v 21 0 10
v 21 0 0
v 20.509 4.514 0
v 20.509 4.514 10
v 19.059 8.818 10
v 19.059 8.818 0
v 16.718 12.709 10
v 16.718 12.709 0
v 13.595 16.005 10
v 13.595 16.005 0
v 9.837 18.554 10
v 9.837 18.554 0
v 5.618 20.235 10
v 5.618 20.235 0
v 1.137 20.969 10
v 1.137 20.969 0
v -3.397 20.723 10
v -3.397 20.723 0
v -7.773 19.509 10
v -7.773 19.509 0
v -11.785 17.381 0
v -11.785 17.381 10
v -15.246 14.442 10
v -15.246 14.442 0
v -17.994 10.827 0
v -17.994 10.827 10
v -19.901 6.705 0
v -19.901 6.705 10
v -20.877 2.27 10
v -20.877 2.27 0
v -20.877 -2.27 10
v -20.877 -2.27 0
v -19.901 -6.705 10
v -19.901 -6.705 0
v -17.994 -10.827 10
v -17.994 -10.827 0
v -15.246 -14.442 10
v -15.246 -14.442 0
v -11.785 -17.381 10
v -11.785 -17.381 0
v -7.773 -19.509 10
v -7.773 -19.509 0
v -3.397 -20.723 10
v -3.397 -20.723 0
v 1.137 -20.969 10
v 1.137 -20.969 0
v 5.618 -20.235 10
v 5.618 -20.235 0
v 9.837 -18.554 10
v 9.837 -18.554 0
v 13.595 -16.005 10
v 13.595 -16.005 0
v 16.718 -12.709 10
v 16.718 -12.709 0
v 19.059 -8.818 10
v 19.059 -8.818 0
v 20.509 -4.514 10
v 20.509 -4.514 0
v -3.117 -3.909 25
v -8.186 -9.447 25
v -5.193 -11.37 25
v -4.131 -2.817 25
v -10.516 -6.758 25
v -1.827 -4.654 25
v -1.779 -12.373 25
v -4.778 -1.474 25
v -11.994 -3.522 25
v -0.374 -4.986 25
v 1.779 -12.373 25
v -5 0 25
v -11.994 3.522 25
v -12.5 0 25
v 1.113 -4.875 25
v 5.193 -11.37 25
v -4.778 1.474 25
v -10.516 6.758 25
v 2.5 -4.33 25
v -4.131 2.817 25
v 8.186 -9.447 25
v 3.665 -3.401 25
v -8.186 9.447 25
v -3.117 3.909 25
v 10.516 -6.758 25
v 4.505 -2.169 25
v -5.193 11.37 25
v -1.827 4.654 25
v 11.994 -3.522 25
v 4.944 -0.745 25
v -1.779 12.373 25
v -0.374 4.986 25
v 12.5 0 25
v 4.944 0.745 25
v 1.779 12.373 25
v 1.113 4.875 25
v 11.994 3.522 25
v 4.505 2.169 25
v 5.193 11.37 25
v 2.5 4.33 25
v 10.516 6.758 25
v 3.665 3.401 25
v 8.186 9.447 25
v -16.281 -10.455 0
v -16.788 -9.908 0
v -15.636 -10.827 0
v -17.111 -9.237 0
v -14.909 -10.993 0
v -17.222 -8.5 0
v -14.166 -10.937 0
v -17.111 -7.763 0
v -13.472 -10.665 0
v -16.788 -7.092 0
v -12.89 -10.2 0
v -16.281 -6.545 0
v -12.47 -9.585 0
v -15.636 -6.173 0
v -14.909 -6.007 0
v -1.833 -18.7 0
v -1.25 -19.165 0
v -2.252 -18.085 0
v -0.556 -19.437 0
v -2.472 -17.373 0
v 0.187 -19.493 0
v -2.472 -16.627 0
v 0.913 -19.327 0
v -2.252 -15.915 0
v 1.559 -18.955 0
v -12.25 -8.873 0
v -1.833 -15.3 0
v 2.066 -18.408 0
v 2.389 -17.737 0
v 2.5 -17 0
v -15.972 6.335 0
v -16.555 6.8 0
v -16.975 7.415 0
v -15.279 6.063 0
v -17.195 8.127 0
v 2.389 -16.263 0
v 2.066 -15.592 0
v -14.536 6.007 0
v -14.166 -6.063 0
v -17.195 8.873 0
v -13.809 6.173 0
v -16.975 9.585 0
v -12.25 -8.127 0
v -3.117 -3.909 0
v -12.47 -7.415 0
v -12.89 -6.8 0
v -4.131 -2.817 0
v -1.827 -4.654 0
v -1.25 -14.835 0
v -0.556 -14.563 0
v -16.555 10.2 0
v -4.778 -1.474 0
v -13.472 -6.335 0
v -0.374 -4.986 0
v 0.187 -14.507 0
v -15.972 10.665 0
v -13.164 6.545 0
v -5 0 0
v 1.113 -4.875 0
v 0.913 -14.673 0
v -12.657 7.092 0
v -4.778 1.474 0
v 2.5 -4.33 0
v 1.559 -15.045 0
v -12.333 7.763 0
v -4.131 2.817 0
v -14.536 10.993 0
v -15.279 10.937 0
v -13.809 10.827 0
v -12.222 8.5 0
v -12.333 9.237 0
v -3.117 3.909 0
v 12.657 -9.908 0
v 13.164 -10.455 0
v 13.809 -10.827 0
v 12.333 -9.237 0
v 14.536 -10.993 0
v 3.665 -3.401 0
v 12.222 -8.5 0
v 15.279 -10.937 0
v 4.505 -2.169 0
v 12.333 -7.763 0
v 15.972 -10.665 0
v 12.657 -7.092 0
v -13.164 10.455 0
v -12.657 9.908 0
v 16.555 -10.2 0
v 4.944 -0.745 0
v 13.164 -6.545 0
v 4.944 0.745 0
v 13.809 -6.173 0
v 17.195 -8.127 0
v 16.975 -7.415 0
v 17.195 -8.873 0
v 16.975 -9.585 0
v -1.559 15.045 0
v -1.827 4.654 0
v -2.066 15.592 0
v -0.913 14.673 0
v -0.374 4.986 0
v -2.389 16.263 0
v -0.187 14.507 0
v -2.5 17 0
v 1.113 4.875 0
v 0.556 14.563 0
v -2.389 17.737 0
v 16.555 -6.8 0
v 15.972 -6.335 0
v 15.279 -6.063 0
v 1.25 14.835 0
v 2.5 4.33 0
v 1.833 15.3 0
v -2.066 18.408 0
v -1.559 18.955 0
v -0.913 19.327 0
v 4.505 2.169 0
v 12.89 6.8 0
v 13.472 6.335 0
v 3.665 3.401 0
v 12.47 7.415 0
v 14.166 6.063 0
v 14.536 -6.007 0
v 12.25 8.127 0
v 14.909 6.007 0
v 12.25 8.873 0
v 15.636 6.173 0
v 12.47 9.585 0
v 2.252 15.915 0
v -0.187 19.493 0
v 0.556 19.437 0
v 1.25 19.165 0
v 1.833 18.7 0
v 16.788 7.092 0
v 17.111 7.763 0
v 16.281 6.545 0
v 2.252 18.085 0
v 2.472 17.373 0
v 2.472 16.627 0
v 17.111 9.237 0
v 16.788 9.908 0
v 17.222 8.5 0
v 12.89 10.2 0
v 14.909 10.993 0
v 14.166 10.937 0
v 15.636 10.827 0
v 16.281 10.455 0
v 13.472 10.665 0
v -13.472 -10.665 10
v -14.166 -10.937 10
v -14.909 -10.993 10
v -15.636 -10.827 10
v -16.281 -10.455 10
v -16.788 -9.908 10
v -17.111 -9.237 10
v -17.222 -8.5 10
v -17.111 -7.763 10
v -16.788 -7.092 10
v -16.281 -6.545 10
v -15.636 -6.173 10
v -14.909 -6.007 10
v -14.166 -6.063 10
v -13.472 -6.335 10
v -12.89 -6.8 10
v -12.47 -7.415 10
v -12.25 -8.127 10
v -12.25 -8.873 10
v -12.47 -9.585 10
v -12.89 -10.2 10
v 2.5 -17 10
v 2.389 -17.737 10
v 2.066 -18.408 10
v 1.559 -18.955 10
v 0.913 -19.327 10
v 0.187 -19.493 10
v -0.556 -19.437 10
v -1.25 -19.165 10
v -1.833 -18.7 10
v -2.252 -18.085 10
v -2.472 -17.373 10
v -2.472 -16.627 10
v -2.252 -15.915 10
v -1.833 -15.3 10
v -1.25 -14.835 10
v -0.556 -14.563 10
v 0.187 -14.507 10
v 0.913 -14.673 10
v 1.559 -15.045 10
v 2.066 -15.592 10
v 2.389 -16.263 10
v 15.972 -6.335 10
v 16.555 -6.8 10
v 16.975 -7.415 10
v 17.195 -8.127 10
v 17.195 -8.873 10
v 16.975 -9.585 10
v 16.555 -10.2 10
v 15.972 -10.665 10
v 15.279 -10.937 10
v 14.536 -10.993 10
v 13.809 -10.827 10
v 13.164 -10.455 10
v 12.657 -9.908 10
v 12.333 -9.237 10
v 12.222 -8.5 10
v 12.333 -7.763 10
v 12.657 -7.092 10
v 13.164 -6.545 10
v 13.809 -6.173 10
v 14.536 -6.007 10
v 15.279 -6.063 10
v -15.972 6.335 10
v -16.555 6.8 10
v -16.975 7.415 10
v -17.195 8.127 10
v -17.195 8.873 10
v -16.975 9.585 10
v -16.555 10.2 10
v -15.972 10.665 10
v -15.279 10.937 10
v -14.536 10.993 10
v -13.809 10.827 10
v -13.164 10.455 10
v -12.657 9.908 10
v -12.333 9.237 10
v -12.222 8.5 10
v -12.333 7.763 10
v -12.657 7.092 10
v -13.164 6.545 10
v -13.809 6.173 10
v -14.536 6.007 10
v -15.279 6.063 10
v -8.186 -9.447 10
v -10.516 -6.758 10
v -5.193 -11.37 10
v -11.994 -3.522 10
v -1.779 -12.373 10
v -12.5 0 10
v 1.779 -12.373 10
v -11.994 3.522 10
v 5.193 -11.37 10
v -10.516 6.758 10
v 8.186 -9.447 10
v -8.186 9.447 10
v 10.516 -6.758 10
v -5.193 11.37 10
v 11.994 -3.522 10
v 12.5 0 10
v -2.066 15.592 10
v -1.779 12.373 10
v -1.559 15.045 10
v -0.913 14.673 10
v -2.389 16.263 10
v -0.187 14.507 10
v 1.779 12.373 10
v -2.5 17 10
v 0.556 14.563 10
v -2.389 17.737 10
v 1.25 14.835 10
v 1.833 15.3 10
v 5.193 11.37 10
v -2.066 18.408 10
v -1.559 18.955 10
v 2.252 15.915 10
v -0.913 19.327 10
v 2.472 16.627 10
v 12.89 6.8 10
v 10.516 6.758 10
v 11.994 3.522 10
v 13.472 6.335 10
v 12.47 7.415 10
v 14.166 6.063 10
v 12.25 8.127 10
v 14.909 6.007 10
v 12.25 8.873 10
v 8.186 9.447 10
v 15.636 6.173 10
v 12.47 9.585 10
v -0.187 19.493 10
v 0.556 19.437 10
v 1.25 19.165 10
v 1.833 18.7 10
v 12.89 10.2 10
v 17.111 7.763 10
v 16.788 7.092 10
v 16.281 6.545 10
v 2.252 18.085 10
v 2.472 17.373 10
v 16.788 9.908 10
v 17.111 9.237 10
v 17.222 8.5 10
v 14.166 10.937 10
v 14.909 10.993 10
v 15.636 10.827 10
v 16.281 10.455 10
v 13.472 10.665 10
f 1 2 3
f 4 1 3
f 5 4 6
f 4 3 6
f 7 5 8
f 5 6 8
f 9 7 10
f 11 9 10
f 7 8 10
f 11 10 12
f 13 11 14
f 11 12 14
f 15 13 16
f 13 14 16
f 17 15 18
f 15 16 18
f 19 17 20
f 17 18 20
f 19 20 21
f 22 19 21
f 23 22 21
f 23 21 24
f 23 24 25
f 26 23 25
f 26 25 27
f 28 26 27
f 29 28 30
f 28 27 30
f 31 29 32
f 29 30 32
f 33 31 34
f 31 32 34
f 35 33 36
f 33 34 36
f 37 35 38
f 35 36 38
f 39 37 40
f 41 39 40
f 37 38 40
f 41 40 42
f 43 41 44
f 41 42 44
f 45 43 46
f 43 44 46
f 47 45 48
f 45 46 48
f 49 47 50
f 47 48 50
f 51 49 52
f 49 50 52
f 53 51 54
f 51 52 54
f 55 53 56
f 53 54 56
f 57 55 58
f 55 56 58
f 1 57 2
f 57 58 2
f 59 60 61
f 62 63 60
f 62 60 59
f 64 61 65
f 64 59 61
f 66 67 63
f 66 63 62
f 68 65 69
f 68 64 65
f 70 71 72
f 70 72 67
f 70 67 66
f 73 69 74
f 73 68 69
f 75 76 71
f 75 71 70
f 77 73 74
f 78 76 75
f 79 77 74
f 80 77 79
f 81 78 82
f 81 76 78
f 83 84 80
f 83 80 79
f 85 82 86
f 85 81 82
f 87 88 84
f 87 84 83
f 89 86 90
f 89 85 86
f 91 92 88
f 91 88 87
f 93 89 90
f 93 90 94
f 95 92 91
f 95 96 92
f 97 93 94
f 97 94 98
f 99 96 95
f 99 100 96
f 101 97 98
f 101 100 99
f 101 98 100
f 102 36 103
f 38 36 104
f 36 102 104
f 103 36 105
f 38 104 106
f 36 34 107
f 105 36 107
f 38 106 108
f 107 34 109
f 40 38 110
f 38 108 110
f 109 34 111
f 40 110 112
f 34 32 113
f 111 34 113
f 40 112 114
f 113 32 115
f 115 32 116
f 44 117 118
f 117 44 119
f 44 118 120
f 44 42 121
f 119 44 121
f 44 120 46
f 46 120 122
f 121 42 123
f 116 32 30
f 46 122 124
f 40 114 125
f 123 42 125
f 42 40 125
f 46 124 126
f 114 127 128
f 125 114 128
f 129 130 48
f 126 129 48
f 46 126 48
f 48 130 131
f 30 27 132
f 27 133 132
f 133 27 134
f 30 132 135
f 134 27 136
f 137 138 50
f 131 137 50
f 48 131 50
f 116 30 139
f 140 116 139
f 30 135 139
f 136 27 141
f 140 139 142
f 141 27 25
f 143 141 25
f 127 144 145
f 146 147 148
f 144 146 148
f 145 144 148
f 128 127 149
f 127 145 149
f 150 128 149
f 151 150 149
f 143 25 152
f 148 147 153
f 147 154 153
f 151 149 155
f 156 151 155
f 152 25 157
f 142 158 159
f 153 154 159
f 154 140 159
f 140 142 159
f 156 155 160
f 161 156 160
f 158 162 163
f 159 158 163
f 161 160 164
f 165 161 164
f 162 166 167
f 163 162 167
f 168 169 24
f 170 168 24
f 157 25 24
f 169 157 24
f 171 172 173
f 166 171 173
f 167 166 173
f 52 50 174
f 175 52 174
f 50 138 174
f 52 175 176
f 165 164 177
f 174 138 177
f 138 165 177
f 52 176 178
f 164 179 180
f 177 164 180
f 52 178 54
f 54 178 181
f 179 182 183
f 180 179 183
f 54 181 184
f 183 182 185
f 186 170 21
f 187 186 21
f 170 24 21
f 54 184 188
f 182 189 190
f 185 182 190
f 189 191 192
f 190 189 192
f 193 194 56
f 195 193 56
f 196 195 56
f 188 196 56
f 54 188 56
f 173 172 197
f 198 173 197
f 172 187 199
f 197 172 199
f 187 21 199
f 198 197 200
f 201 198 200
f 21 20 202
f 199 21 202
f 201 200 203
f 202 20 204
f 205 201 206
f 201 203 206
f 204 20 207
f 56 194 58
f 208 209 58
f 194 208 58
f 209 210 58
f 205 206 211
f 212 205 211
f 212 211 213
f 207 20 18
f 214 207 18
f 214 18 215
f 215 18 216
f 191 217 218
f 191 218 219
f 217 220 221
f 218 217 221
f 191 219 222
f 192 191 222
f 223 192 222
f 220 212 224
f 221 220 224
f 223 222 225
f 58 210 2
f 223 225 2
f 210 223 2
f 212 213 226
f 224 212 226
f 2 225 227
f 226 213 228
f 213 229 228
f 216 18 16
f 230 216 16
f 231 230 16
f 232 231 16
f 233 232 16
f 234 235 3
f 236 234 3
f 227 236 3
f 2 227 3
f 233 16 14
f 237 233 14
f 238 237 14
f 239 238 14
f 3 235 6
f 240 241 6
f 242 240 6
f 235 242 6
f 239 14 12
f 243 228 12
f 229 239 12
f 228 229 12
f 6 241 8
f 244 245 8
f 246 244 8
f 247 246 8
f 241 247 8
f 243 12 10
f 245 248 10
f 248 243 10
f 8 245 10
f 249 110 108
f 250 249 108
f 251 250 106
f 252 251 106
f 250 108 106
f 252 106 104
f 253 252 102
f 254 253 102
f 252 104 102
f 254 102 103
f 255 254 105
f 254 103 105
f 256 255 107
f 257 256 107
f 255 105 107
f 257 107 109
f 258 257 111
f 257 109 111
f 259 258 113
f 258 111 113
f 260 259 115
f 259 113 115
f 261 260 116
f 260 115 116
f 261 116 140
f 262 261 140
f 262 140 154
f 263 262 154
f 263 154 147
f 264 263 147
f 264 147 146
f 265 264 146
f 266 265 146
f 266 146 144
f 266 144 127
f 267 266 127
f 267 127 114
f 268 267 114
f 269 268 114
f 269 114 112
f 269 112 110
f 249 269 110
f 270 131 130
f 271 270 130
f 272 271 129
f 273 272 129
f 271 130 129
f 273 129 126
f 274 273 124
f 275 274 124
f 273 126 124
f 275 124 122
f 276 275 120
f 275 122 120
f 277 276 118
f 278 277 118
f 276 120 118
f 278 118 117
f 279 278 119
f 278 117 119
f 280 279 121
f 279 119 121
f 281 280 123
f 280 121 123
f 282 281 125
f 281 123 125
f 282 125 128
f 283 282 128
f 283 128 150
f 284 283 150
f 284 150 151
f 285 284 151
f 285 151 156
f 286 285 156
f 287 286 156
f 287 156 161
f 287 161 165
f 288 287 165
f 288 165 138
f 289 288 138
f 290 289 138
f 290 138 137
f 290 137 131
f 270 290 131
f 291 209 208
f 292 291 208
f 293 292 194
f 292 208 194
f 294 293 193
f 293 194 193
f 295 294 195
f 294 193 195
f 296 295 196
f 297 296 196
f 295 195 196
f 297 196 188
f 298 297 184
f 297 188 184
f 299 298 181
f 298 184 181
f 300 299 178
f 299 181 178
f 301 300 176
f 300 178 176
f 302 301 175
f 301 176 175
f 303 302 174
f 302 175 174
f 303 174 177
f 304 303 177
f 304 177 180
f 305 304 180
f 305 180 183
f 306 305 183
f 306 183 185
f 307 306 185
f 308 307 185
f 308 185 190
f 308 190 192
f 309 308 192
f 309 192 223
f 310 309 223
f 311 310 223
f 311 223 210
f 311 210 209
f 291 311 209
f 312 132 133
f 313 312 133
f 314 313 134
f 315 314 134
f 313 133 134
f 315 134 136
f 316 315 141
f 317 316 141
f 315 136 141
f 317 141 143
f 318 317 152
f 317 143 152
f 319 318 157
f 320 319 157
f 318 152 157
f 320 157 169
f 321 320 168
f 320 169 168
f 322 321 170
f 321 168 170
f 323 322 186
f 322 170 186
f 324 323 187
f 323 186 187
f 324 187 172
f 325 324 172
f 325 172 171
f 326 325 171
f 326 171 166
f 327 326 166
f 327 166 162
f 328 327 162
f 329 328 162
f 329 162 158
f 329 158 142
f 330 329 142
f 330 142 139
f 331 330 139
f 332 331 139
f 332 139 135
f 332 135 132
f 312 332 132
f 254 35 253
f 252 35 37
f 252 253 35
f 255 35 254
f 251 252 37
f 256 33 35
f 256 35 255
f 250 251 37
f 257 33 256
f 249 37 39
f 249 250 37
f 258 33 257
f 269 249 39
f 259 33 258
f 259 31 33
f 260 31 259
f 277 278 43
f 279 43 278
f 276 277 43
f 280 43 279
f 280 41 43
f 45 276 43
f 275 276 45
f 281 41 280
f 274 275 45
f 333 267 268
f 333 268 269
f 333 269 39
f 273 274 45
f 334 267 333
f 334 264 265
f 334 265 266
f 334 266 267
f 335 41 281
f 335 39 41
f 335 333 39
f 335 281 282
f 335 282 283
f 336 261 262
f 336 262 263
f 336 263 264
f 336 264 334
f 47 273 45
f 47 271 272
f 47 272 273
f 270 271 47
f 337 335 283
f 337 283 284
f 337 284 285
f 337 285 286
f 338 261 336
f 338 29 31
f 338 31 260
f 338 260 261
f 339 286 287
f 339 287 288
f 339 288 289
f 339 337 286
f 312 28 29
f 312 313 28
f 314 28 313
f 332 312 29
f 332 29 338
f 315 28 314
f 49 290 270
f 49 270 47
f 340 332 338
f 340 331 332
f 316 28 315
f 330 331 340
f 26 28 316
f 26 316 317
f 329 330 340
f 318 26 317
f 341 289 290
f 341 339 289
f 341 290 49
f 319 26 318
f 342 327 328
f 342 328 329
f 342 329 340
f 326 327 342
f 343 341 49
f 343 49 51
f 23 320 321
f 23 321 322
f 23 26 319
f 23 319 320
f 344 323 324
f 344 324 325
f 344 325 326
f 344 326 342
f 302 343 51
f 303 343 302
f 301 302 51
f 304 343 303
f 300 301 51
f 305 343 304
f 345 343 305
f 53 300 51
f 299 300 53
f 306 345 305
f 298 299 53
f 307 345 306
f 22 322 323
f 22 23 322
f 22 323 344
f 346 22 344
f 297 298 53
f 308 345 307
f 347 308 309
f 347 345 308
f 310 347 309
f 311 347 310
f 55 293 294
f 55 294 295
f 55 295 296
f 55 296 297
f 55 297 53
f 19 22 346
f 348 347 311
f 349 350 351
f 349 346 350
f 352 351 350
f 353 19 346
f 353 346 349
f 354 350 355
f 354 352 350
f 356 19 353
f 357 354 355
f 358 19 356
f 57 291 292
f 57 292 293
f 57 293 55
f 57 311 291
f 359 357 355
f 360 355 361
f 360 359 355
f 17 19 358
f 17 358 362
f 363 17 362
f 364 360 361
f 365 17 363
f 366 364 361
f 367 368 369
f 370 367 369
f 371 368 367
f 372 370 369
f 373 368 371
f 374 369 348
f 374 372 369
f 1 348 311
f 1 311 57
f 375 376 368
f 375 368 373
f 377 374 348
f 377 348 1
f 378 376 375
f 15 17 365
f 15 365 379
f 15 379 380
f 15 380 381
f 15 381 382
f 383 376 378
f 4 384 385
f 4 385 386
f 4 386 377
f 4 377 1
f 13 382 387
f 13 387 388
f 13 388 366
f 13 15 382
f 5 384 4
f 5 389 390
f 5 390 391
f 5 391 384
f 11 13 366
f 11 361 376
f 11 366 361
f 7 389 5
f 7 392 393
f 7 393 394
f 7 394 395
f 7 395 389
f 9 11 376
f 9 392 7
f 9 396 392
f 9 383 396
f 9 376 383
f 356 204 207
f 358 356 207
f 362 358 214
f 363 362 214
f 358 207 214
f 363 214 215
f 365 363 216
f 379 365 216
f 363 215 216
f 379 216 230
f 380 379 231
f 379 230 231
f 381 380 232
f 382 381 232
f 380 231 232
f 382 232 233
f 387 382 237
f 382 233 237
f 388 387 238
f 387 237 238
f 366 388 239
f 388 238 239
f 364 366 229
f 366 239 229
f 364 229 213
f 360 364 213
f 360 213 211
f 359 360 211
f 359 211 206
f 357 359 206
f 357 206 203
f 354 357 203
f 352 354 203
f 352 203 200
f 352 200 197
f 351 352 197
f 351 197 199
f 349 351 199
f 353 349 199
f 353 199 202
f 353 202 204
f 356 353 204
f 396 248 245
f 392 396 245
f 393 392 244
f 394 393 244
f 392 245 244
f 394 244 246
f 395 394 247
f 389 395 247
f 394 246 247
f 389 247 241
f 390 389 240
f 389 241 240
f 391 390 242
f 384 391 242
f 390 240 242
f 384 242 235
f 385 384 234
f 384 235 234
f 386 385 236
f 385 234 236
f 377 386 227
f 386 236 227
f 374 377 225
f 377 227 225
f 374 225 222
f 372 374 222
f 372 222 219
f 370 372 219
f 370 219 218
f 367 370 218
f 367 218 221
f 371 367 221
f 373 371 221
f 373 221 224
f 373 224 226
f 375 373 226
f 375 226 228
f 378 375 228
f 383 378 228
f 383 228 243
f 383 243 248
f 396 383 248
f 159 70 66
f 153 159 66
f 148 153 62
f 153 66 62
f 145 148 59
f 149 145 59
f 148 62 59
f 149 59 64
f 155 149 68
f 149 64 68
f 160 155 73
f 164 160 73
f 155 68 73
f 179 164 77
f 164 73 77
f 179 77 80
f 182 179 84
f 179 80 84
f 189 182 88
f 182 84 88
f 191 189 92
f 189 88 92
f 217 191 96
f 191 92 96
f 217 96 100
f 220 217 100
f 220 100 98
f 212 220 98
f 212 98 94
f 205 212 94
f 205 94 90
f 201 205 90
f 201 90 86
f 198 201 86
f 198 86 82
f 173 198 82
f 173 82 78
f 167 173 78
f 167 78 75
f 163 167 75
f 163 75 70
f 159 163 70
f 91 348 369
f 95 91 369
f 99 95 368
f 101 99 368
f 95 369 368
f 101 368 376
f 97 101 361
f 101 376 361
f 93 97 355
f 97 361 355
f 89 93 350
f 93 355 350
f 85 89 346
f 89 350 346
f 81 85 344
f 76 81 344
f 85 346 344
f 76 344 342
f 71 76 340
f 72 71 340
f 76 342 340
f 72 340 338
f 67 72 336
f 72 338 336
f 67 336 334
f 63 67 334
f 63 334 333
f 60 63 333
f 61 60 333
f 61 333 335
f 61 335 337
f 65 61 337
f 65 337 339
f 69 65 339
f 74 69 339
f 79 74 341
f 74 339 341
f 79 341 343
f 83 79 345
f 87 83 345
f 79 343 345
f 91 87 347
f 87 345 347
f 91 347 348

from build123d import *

# Parameters (mm, degrees)
SZKIC1_R                               = 21
DODANIE_WYCI_GNI_CIE1_DEPTH            = 10
SZKIC2_R                               = 12.5
DODANIE_WYCI_GNI_CIE2_DEPTH            = 15
OTWORY_USTALAJ_CE_5_0MM1_D             = 5
SZYK_KO_OWY1_COUNT                     = 6
WYTNIJ_WYCI_GNI_CIE1_REACH             = 40.82
SZKIC8_R                               = 5
WYTNIJ_WYCI_GNI_CIE1_DIRECTION_2_DEPTH = 39.820097888


with BuildPart() as part:
    # Szkic1 → Dodanie-wyciągnięcie1 (new body)
    with BuildSketch(Plane.XY):
        Circle(SZKIC1_R)
    extrude(amount=DODANIE_WYCI_GNI_CIE1_DEPTH)

    # Szkic2 → Dodanie-wyciągnięcie2 (add)
    with BuildSketch(Plane.XY.offset(10)):
        Circle(SZKIC2_R)
    extrude(amount=DODANIE_WYCI_GNI_CIE2_DEPTH)

    # Otwory ustalające Ø5.0mm1 (through all)
    with Locations(Plane.XY.offset(10)):
        with Locations((0, 17)):
            otwory_ustalaj_ce_5_0mm1 = Hole(OTWORY_USTALAJ_CE_5_0MM1_D / 2)

    # Szyk kołowy1: Otwory ustalające Ø5.0mm1 ×6 about axis
    szyk_ko_owy1_axis = Axis((0, 0, 0), (0, 0, 1))
    for i in range(1, SZYK_KO_OWY1_COUNT):
        add(otwory_ustalaj_ce_5_0mm1.rotate(szyk_ko_owy1_axis, i * 360 / SZYK_KO_OWY1_COUNT), mode=Mode.SUBTRACT)

    # Szkic8 → Wytnij-wyciągnięcie1 (cut, up to next)
    with BuildSketch(Plane.XY.offset(25), mode=Mode.PRIVATE) as wytnij_wyci_gni_cie1_sk1:
        with Locations(Location((0, 0, 0), (0, 0, 180))):
            Circle(SZKIC8_R)
    wytnij_wyci_gni_cie1_tool1 = extrude(wytnij_wyci_gni_cie1_sk1.sketch, amount=-WYTNIJ_WYCI_GNI_CIE1_REACH, mode=Mode.PRIVATE) & part.part
    add(wytnij_wyci_gni_cie1_tool1.solids().sort_by_distance((0, 0, 25))[0], mode=Mode.SUBTRACT)

    # Szkic8 → Wytnij-wyciągnięcie1 direction 2 (cut)
    with BuildSketch(Plane.XY.offset(25)):
        with Locations(Location((0, 0, 0), (0, 0, 180))):
            Circle(SZKIC8_R)
    extrude(amount=WYTNIJ_WYCI_GNI_CIE1_DIRECTION_2_DEPTH, mode=Mode.SUBTRACT)


solid = part.part
